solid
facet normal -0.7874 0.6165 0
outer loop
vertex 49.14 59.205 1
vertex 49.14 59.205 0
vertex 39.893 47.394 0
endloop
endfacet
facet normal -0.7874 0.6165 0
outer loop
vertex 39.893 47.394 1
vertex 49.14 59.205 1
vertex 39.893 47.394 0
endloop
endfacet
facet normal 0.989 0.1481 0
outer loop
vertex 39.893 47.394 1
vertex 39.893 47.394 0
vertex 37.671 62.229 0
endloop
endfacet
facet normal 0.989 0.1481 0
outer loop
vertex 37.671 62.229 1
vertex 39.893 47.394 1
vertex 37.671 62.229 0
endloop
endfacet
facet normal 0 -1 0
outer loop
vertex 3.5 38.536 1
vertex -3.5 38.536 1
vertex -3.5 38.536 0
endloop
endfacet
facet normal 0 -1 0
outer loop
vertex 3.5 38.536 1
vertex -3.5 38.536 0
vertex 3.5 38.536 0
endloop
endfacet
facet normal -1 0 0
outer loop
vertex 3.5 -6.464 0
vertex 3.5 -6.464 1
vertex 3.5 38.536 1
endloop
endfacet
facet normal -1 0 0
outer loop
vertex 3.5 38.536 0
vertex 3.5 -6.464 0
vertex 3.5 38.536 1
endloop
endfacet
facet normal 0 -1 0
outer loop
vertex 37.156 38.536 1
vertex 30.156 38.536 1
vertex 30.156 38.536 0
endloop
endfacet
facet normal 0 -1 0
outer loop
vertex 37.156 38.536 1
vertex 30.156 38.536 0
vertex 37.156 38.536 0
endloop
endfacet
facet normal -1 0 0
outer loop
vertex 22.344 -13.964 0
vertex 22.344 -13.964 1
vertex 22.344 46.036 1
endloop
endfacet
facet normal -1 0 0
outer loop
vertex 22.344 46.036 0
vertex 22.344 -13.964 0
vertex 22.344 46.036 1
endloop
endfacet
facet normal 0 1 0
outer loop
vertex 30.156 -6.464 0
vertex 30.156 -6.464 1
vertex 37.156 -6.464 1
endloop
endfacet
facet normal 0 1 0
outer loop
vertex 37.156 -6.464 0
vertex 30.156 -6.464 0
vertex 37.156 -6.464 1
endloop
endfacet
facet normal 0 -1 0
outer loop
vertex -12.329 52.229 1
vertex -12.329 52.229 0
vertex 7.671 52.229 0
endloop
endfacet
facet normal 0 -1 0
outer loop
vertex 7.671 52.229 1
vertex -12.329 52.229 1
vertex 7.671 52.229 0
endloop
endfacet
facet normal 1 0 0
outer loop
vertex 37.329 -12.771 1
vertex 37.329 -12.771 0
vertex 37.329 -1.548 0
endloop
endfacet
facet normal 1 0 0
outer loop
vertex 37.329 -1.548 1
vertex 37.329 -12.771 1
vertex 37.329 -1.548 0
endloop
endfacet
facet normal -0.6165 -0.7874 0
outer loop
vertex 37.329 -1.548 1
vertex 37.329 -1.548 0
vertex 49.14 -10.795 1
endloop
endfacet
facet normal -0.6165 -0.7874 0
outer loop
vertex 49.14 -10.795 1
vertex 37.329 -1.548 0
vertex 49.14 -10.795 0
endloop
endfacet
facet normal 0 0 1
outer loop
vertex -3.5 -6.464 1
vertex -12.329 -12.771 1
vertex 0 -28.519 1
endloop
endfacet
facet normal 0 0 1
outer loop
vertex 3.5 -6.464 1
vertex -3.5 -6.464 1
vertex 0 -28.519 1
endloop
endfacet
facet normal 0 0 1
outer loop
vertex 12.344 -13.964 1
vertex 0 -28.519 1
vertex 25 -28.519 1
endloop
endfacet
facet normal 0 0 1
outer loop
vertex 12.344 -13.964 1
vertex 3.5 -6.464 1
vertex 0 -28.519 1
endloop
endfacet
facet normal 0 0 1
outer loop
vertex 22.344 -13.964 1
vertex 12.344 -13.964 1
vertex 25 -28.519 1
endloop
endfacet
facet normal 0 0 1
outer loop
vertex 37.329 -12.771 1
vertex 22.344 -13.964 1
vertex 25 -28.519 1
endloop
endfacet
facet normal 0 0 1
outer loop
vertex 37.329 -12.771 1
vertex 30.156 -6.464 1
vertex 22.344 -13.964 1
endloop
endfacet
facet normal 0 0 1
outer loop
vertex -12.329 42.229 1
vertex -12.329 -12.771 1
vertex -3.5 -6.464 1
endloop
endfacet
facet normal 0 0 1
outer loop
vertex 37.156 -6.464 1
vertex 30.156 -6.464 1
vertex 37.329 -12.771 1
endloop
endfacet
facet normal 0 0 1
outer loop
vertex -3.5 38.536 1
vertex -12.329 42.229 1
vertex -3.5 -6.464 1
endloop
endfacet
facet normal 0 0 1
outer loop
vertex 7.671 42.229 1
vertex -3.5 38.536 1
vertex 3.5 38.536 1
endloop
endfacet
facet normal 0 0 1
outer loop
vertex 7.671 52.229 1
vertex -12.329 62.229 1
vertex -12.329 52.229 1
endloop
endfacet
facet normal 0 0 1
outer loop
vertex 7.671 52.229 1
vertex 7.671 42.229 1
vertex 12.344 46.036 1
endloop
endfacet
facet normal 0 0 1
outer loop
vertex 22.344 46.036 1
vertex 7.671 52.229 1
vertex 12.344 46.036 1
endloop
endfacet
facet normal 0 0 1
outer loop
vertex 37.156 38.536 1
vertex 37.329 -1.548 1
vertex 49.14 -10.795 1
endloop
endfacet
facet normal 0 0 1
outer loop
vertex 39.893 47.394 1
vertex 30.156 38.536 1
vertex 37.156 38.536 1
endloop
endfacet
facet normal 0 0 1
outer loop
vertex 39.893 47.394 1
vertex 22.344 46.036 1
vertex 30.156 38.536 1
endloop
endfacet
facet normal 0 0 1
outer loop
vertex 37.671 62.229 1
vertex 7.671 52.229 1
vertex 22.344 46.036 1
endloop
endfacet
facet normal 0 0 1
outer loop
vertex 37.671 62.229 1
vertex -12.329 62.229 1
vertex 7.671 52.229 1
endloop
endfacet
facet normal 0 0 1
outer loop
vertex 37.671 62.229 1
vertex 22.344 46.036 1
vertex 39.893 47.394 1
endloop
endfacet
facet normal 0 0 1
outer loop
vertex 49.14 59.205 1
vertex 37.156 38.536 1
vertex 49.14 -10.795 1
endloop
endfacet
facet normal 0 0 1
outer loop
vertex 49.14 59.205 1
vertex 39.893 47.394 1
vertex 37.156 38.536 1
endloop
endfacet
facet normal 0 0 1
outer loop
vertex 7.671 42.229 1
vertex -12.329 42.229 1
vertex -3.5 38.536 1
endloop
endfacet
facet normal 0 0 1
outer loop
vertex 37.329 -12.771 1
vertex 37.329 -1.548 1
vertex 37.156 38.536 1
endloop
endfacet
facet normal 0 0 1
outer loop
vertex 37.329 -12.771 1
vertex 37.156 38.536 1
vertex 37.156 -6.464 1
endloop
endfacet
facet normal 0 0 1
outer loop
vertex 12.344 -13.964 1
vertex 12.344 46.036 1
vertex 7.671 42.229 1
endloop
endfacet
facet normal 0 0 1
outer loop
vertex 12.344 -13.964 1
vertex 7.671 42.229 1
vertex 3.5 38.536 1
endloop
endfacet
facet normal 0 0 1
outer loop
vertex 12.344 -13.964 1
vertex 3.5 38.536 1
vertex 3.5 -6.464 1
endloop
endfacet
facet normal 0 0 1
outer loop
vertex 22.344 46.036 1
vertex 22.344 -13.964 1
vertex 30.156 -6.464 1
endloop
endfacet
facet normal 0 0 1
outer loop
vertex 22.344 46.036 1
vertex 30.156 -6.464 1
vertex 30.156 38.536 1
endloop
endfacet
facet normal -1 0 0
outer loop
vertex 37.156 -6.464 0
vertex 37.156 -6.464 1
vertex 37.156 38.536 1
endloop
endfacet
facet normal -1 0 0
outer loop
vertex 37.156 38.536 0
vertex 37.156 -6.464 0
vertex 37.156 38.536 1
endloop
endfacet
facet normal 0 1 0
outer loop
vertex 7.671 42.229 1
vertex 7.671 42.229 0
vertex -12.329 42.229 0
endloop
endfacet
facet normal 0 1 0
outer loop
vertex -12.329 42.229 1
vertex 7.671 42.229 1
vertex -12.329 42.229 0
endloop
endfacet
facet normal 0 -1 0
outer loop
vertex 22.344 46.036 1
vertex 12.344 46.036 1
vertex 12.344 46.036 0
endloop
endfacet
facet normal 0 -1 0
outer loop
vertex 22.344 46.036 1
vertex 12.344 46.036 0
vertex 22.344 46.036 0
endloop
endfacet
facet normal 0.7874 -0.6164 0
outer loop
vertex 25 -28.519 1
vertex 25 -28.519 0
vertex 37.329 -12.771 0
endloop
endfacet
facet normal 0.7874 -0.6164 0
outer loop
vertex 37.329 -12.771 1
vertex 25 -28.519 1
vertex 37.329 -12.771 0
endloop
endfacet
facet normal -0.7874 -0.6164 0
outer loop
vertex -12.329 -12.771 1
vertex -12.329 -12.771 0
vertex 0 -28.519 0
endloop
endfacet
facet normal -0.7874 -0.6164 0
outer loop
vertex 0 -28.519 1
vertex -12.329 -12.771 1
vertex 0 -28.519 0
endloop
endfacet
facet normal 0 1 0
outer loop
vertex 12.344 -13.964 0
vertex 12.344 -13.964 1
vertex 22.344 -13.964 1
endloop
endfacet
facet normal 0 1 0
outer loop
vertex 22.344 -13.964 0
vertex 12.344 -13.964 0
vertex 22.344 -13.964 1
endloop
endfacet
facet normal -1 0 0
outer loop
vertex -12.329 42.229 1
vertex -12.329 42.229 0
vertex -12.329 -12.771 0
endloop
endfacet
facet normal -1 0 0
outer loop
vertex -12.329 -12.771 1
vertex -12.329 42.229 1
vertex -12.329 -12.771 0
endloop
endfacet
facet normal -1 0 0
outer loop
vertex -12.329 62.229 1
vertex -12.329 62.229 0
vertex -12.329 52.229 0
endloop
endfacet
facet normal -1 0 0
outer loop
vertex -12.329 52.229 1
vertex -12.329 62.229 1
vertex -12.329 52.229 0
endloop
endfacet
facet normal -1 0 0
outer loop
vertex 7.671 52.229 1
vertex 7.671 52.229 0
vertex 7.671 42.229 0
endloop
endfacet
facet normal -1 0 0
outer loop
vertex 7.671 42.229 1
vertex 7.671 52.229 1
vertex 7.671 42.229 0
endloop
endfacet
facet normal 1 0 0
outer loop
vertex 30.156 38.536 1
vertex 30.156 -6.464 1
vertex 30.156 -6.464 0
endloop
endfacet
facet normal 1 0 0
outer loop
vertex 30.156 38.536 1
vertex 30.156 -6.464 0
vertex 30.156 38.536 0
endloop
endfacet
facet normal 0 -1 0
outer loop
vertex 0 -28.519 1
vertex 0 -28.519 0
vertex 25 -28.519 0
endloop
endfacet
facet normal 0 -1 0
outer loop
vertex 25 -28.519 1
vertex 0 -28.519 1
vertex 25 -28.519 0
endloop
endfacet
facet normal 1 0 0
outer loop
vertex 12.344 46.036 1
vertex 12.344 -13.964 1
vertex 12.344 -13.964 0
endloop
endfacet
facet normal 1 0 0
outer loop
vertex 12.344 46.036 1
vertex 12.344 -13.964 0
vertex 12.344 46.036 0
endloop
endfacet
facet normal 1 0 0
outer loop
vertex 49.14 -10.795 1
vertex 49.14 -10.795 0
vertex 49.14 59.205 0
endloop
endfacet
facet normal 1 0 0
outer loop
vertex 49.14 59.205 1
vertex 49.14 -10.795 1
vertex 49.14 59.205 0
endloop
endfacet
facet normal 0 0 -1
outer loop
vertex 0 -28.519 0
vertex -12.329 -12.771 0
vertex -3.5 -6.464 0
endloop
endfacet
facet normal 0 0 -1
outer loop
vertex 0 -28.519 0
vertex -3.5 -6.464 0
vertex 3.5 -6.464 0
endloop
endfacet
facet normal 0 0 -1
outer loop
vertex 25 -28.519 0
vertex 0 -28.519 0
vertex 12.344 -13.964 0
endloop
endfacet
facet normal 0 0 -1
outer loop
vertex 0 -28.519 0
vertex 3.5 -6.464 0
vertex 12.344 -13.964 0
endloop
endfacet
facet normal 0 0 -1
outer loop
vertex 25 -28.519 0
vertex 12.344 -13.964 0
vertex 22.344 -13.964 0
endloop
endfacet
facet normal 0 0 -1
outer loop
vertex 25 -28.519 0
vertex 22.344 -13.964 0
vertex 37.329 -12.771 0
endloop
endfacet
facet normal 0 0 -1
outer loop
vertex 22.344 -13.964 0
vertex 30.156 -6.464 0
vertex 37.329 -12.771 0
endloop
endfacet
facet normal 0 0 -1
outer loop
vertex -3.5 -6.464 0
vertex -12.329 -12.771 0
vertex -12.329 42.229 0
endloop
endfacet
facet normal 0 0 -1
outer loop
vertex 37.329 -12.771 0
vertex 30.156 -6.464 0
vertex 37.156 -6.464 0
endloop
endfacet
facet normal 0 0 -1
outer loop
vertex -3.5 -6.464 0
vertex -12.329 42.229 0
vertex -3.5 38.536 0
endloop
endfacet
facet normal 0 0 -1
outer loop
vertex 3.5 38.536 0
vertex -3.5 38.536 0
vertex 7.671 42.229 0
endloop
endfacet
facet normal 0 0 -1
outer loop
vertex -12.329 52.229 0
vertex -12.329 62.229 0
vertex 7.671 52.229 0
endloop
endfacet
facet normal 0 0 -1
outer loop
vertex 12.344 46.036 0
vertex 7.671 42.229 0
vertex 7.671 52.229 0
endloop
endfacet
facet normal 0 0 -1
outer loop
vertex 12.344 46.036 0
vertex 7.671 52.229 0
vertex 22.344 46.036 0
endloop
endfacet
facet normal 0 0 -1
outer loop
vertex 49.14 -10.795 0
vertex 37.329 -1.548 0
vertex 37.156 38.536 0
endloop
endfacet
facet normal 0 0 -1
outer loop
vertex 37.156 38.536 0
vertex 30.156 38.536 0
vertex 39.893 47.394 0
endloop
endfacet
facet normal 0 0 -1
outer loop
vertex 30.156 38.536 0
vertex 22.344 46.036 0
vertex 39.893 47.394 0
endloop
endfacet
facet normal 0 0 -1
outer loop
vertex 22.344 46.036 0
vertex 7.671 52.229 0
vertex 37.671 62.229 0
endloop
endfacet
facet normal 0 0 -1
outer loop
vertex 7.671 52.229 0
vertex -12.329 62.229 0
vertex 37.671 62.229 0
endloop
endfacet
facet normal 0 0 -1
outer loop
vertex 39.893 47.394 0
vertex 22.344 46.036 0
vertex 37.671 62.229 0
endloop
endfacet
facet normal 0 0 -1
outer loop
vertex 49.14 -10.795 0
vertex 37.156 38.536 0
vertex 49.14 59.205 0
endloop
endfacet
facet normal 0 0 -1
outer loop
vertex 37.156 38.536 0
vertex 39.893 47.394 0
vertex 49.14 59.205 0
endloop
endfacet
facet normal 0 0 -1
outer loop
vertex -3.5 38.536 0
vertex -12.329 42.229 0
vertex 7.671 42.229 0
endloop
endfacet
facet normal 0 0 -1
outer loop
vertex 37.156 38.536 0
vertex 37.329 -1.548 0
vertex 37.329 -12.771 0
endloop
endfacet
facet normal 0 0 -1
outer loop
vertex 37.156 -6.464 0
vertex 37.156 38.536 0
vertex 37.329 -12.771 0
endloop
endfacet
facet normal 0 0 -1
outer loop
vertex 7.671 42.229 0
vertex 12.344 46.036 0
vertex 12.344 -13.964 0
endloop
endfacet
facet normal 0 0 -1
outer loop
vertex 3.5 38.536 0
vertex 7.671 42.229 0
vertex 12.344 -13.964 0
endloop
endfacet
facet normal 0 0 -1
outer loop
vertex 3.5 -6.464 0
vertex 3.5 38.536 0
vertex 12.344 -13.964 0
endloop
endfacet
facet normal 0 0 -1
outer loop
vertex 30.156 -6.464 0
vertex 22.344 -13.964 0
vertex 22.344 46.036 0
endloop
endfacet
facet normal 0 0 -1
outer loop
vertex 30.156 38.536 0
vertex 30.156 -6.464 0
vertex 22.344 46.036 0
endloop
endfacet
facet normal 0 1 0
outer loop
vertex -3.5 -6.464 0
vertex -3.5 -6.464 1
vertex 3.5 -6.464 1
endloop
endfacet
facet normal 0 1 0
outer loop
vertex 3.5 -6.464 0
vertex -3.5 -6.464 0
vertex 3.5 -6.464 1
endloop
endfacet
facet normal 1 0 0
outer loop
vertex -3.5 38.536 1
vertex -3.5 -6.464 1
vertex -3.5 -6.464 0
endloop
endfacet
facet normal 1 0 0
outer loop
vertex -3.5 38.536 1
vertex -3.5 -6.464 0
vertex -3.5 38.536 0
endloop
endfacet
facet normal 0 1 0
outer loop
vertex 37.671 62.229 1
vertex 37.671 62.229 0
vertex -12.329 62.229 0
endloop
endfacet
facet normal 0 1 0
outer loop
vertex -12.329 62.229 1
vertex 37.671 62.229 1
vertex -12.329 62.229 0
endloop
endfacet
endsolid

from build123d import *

# Parameters (mm, degrees)
F1_DEPTH = 1
F2_W     = 10
F2_H     = 60
F2_W_2   = 7
F2_H_2   = 45
F3_DEPTH = 25


with BuildPart() as f1:
    # F0 (on Top) → F1 (new body)
    with BuildSketch(Plane.XY):
        Polygon((49.139852, 59.205397), (39.893209, 47.394403), (37.671142, 62.228904), (-12.328858, 62.228904), (-12.328858, 52.228904), (7.671142, 52.228904), (7.671142, 42.228904), (-12.328858, 42.228904), (-12.328858, -12.771096), (0, -28.519088), (25, -28.519088), (37.328858, -12.771096), (37.328858, -1.547959), (49.139852, -10.794603), align=None)
    extrude(amount=F1_DEPTH)

    # F2 (on face) → F3 (cut)
    with BuildSketch(Plane.XY.offset(1)):
        with Locations((17.343746, 16.035888)):
            Rectangle(F2_W, F2_H)
        with Locations((0, 16.035878)):
            Rectangle(F2_W_2, F2_H_2)
        with Locations((33.656242, 16.035886)):
            Rectangle(F2_W_2, F2_H_2)
    extrude(amount=-F3_DEPTH, mode=Mode.SUBTRACT)


solid = f1.part
